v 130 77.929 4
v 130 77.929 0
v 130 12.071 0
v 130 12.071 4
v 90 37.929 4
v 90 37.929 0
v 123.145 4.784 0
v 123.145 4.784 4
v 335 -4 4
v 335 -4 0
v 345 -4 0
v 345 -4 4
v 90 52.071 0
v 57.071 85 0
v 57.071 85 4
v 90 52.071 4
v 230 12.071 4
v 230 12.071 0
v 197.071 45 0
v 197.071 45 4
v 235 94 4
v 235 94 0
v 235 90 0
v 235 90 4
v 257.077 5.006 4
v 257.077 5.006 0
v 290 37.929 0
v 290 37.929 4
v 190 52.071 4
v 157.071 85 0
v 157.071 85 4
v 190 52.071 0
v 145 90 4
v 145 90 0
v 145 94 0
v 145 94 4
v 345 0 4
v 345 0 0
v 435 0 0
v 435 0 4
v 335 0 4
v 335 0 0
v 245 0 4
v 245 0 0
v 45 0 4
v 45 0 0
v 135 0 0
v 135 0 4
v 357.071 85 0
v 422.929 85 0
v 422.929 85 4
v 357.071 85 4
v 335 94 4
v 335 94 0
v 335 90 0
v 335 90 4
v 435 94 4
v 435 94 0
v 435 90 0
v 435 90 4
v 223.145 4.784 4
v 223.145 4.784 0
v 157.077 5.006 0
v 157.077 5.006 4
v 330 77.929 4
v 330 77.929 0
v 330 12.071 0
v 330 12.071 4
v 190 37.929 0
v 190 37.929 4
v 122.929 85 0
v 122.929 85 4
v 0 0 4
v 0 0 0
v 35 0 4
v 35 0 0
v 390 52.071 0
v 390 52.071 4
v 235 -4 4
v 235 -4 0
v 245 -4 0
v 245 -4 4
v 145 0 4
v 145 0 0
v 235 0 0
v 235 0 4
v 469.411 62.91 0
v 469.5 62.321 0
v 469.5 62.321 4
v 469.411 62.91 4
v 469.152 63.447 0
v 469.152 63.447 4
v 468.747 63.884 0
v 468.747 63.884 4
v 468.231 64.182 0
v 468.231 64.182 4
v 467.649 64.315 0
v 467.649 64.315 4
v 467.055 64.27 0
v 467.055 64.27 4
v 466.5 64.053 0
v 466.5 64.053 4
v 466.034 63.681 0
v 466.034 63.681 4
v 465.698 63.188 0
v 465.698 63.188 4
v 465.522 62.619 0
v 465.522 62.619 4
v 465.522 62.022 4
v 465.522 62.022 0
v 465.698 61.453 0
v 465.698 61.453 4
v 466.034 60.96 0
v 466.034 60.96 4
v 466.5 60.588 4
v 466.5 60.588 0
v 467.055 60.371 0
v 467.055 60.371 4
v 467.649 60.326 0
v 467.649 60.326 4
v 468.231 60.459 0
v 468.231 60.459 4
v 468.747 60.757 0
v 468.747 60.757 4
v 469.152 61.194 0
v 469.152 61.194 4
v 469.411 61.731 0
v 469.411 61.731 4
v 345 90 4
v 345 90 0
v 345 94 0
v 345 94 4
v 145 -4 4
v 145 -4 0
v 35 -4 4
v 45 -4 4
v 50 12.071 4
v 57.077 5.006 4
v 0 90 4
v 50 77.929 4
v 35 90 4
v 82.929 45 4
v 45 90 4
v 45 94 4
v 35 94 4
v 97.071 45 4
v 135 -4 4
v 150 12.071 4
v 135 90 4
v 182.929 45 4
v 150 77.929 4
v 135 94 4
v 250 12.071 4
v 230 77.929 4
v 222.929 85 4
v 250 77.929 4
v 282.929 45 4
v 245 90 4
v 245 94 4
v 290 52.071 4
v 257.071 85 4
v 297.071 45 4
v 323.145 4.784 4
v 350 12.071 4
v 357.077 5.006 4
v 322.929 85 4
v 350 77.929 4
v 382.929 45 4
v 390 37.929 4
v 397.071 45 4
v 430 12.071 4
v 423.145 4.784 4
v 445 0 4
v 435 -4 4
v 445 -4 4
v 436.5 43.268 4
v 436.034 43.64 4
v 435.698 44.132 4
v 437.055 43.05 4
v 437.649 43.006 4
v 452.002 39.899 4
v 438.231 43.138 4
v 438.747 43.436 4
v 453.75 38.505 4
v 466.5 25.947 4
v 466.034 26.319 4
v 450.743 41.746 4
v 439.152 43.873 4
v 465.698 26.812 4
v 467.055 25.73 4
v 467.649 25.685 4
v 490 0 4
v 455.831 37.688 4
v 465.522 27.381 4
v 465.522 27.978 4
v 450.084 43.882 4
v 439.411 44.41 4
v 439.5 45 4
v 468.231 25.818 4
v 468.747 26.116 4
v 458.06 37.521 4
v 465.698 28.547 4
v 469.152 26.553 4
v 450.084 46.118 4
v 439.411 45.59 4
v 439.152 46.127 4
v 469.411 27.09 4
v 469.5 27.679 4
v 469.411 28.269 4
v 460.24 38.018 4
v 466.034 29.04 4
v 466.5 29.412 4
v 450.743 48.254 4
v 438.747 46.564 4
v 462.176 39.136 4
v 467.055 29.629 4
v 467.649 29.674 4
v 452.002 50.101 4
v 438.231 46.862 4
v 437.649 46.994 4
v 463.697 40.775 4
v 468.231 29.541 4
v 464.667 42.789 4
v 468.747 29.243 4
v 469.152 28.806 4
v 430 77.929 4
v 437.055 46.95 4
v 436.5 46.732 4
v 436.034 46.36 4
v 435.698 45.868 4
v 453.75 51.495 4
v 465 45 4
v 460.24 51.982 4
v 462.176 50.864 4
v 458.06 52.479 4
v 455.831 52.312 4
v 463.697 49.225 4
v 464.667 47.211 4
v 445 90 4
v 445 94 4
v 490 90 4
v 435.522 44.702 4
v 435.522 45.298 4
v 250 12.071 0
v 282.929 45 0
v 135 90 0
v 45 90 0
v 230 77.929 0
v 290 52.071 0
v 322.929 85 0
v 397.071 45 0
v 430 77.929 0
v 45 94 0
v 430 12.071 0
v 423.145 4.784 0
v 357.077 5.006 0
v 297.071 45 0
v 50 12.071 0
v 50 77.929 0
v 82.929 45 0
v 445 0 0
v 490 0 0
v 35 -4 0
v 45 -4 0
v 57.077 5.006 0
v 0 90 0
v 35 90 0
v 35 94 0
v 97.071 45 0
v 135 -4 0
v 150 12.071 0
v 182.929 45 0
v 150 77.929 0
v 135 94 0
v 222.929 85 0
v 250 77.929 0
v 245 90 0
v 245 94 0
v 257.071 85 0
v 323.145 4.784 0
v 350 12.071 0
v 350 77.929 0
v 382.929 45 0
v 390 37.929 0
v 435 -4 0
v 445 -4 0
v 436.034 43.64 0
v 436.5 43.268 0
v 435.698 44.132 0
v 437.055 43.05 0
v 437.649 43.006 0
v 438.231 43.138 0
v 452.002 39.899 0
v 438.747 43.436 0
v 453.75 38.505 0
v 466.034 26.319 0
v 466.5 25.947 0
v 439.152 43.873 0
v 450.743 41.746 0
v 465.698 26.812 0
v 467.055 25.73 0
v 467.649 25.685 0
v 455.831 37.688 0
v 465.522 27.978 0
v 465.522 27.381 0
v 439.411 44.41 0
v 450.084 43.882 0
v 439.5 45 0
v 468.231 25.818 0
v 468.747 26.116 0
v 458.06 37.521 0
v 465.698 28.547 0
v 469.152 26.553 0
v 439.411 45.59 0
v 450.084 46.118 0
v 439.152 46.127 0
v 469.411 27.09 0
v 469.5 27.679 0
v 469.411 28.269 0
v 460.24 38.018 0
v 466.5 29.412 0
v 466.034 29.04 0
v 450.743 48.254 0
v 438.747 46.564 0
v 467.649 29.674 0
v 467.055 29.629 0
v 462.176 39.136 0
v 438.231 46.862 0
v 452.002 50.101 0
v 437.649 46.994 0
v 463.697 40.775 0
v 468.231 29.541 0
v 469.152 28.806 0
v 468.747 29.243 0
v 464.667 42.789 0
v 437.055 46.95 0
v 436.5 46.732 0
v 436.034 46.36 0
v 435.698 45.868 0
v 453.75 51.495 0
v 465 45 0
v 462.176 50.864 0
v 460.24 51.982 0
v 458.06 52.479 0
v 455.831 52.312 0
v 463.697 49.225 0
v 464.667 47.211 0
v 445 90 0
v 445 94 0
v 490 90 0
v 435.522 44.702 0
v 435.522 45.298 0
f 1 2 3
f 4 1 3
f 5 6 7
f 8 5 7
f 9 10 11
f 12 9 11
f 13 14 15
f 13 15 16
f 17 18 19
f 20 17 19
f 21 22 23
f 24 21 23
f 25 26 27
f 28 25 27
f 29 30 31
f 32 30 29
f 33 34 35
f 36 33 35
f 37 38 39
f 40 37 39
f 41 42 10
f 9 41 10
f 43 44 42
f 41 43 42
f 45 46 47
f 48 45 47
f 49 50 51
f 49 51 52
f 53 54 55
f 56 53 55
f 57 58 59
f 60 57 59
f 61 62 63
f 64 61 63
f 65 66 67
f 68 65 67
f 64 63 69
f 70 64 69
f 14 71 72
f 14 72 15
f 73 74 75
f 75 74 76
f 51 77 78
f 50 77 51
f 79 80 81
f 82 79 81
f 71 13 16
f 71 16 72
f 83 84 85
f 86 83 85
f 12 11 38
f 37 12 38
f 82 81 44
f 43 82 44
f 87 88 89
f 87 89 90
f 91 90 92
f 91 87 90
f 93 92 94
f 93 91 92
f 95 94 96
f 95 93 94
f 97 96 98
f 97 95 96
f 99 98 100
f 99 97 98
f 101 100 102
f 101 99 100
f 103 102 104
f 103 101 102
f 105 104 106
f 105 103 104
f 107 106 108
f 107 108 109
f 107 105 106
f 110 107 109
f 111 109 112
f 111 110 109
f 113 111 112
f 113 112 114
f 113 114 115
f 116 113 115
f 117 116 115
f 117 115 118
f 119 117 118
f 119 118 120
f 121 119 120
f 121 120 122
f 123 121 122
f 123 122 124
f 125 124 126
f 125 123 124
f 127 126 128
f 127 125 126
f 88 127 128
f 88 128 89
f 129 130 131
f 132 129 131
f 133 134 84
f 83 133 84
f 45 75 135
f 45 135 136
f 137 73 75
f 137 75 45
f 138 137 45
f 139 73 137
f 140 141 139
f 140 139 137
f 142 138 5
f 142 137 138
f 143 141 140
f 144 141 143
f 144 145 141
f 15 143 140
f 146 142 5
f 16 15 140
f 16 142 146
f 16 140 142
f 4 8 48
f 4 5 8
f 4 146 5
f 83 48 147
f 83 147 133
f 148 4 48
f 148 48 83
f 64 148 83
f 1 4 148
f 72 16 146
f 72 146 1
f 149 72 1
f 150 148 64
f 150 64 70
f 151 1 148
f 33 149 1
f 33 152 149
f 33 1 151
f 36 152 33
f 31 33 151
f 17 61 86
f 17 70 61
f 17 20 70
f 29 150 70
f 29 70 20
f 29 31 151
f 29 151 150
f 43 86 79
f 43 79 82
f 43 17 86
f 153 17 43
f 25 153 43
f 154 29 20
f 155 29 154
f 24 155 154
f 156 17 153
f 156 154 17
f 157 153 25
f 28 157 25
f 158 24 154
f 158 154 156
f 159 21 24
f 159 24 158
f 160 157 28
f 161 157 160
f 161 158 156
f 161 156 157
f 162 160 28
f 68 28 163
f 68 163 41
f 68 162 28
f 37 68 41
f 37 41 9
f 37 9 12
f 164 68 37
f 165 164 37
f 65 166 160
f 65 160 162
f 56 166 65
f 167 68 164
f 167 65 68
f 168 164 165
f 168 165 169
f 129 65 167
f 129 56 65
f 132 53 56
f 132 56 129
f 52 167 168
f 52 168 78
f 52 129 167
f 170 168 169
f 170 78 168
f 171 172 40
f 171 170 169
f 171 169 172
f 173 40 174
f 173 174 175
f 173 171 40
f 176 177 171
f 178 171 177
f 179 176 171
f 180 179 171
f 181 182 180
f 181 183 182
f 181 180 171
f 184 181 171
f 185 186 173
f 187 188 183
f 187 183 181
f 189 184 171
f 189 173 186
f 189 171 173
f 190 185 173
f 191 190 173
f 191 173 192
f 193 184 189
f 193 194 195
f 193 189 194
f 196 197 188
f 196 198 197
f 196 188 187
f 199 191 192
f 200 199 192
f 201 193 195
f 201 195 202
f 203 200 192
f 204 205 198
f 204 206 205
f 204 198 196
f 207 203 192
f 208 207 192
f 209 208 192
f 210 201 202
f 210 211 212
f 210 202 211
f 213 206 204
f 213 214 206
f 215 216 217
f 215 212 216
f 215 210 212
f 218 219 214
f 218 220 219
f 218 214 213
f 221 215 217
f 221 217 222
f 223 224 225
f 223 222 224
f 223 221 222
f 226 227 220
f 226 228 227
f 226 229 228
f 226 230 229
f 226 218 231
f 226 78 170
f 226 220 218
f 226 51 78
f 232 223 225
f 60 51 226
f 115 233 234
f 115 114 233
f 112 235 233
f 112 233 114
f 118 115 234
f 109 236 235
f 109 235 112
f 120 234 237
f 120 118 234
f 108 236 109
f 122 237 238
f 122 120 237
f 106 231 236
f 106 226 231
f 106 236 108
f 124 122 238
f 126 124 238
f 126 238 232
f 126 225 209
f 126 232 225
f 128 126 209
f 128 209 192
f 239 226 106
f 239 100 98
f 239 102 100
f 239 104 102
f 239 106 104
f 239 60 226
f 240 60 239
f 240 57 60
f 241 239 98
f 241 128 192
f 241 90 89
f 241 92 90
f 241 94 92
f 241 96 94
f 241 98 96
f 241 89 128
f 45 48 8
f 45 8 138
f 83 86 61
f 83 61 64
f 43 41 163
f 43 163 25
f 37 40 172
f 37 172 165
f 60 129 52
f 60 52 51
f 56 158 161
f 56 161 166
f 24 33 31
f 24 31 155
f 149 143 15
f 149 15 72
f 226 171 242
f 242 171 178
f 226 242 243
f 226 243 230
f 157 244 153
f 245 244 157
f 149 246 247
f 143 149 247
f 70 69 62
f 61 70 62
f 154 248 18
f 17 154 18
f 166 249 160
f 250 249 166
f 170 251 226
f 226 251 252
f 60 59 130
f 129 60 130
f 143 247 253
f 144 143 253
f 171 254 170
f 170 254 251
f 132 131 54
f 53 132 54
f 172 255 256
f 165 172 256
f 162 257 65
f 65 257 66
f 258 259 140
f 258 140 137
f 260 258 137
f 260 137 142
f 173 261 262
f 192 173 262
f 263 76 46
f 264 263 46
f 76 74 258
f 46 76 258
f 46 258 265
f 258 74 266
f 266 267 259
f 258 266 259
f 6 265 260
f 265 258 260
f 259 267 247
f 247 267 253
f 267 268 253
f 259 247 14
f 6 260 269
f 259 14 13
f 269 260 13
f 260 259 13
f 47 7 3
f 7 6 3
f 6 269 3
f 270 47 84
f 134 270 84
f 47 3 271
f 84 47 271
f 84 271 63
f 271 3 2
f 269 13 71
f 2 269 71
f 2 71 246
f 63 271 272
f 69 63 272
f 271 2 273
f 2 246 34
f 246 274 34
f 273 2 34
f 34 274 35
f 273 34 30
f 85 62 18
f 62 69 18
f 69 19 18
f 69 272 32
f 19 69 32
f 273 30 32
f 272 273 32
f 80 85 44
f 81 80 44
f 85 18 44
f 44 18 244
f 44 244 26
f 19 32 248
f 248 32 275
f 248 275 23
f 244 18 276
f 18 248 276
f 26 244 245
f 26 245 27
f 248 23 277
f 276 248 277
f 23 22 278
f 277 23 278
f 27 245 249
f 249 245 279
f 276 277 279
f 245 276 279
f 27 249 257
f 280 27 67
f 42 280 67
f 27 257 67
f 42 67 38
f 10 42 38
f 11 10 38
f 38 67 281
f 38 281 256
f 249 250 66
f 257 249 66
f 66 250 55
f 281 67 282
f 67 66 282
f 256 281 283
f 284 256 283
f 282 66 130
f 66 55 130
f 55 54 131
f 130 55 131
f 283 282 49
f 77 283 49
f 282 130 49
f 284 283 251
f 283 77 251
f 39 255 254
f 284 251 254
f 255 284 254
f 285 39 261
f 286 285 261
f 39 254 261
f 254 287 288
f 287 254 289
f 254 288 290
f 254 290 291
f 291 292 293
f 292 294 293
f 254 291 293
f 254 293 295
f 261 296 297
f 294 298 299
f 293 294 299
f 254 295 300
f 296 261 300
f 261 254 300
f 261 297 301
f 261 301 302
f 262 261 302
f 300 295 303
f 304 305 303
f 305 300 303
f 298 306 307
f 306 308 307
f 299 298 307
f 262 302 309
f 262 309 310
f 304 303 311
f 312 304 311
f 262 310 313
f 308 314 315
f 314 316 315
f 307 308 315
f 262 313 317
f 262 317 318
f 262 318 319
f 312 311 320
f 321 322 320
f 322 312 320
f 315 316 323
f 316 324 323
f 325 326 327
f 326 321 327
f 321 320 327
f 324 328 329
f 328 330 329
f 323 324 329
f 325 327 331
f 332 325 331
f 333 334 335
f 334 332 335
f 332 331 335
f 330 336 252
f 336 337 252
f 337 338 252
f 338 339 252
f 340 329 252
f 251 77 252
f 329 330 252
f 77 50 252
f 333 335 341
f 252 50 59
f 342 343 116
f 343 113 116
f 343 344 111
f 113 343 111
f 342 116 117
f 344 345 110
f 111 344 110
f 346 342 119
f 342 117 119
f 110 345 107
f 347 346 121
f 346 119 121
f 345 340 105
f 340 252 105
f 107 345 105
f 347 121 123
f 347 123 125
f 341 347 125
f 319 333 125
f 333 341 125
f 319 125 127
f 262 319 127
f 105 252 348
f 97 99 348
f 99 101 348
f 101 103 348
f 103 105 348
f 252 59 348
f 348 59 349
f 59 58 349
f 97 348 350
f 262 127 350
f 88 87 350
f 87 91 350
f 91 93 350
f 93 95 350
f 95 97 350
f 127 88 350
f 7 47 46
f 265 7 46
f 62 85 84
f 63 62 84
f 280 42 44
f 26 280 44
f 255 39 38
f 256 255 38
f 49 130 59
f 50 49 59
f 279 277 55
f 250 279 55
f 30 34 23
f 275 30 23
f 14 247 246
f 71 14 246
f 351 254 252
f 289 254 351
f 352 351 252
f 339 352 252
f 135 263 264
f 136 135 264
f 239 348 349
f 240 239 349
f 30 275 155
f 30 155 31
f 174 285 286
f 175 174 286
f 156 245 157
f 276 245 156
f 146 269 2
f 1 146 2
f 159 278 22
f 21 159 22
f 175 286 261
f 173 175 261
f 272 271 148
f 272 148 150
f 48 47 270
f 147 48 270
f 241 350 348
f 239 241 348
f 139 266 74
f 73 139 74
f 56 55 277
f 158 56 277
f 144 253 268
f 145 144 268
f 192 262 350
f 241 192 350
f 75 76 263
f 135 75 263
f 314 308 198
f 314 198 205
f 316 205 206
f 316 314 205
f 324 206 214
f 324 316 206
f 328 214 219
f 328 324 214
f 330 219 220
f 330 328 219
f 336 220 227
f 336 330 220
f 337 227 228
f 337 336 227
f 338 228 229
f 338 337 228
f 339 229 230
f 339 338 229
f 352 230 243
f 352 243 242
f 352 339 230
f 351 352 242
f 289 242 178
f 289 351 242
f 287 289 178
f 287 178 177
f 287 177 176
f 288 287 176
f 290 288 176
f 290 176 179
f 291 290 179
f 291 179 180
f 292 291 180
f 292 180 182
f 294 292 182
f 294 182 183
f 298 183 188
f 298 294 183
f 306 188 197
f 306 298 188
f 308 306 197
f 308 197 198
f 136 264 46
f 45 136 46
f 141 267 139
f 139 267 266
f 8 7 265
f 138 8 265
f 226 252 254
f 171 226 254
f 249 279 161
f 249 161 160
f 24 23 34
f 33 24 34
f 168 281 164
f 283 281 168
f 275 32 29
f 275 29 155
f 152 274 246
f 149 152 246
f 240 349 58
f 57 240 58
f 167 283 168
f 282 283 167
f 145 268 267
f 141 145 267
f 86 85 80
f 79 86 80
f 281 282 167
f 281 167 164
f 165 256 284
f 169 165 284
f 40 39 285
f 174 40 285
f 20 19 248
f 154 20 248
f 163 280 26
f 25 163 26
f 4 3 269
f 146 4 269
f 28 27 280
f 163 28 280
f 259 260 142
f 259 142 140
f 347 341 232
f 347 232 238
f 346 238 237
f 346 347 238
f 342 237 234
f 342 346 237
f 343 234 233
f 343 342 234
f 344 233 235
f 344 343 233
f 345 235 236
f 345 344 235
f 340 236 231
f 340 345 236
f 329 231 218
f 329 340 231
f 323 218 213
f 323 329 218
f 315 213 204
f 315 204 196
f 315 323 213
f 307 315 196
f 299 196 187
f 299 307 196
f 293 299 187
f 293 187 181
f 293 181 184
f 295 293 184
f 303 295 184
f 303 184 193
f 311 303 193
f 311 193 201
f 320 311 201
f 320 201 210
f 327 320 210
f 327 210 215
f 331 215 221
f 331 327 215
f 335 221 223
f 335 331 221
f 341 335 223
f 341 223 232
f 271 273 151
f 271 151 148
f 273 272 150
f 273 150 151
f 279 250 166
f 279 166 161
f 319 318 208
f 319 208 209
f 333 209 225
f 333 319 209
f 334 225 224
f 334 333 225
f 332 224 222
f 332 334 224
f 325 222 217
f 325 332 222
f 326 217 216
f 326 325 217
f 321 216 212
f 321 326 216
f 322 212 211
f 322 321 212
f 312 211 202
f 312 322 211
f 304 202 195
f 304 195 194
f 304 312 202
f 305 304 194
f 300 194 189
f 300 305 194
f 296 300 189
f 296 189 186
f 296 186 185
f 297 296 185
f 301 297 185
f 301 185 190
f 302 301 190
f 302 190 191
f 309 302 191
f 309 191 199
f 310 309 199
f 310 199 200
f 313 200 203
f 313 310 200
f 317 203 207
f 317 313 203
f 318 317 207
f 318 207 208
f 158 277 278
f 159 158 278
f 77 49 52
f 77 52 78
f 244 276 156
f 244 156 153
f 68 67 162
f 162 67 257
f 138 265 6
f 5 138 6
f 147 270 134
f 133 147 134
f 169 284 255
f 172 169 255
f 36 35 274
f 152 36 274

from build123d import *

# Parameters (mm, degrees)
SCHIZZO1_R                   = 7.5
SCHIZZO1_R_2                 = 2
ESTRUSIONE_ESTRUSIONE1_DEPTH = 4


with BuildPart() as part:
    # Schizzo1 → Estrusione-Estrusione1 (new body)
    with BuildSketch(Plane.XY):
        Polygon((0, 90), (0, 0), (35, 0), (35, -4), (45, -4), (45, 0), (135, 0), (135, -4), (145, -4), (145, 0), (235, 0), (235, -4), (245, -4), (245, 0), (335, 0), (335, -4), (345, -4), (345, 0), (435, 0), (435, -4), (445, -4), (445, 0), (490, 0), (490, 90), (445, 90), (445, 94), (435, 94), (435, 90), (345, 90), (345, 94), (335, 94), (335, 90), (245, 90), (245, 94), (235, 94), (235, 90), (145, 90), (145, 94), (135, 94), (135, 90), (45, 90), (45, 94), (35, 94), (35, 90), align=None)
        with Locations((457.5, 45)):
            Circle(SCHIZZO1_R, mode=Mode.SUBTRACT)
        with Locations((437.5, 45)):
            Circle(SCHIZZO1_R_2, mode=Mode.SUBTRACT)
        with Locations((467.5, 27.679491924)):
            Circle(SCHIZZO1_R_2, mode=Mode.SUBTRACT)
        with Locations((467.5, 62.320508076)):
            Circle(SCHIZZO1_R_2, mode=Mode.SUBTRACT)
        Polygon((50, 77.928932188), (50, 12.071067812), (82.928932188, 45), align=None, mode=Mode.SUBTRACT)
        Polygon((130, 77.928932188), (130, 12.071067812), (97.071067812, 45), align=None, mode=Mode.SUBTRACT)
        Polygon((57.071067812, 85), (90, 52.071067812), (122.928932188, 85), align=None, mode=Mode.SUBTRACT)
        Polygon((123.1448388, 4.784093388), (57.077189669, 5.006121857), (90, 37.928932188), align=None, mode=Mode.SUBTRACT)
        Polygon((150, 77.928932188), (150, 12.071067812), (182.928932188, 45), align=None, mode=Mode.SUBTRACT)
        Polygon((230, 77.928932188), (230, 12.071067812), (197.071067812, 45), align=None, mode=Mode.SUBTRACT)
        Polygon((157.071067812, 85), (190, 52.071067812), (222.928932188, 85), align=None, mode=Mode.SUBTRACT)
        Polygon((223.1448388, 4.784093388), (157.077189669, 5.006121857), (190, 37.928932188), align=None, mode=Mode.SUBTRACT)
        Polygon((250, 77.928932188), (250, 12.071067812), (282.928932188, 45), align=None, mode=Mode.SUBTRACT)
        Polygon((330, 77.928932188), (330, 12.071067812), (297.071067812, 45), align=None, mode=Mode.SUBTRACT)
        Polygon((257.071067812, 85), (290, 52.071067812), (322.928932188, 85), align=None, mode=Mode.SUBTRACT)
        Polygon((323.1448388, 4.784093388), (257.077189669, 5.006121857), (290, 37.928932188), align=None, mode=Mode.SUBTRACT)
        Polygon((350, 77.928932188), (350, 12.071067812), (382.928932188, 45), align=None, mode=Mode.SUBTRACT)
        Polygon((430, 77.928932188), (430, 12.071067812), (397.071067812, 45), align=None, mode=Mode.SUBTRACT)
        Polygon((357.071067812, 85), (390, 52.071067812), (422.928932188, 85), align=None, mode=Mode.SUBTRACT)
        Polygon((423.1448388, 4.784093388), (357.077189669, 5.006121857), (390, 37.928932188), align=None, mode=Mode.SUBTRACT)
    extrude(amount=ESTRUSIONE_ESTRUSIONE1_DEPTH)


solid = part.part
